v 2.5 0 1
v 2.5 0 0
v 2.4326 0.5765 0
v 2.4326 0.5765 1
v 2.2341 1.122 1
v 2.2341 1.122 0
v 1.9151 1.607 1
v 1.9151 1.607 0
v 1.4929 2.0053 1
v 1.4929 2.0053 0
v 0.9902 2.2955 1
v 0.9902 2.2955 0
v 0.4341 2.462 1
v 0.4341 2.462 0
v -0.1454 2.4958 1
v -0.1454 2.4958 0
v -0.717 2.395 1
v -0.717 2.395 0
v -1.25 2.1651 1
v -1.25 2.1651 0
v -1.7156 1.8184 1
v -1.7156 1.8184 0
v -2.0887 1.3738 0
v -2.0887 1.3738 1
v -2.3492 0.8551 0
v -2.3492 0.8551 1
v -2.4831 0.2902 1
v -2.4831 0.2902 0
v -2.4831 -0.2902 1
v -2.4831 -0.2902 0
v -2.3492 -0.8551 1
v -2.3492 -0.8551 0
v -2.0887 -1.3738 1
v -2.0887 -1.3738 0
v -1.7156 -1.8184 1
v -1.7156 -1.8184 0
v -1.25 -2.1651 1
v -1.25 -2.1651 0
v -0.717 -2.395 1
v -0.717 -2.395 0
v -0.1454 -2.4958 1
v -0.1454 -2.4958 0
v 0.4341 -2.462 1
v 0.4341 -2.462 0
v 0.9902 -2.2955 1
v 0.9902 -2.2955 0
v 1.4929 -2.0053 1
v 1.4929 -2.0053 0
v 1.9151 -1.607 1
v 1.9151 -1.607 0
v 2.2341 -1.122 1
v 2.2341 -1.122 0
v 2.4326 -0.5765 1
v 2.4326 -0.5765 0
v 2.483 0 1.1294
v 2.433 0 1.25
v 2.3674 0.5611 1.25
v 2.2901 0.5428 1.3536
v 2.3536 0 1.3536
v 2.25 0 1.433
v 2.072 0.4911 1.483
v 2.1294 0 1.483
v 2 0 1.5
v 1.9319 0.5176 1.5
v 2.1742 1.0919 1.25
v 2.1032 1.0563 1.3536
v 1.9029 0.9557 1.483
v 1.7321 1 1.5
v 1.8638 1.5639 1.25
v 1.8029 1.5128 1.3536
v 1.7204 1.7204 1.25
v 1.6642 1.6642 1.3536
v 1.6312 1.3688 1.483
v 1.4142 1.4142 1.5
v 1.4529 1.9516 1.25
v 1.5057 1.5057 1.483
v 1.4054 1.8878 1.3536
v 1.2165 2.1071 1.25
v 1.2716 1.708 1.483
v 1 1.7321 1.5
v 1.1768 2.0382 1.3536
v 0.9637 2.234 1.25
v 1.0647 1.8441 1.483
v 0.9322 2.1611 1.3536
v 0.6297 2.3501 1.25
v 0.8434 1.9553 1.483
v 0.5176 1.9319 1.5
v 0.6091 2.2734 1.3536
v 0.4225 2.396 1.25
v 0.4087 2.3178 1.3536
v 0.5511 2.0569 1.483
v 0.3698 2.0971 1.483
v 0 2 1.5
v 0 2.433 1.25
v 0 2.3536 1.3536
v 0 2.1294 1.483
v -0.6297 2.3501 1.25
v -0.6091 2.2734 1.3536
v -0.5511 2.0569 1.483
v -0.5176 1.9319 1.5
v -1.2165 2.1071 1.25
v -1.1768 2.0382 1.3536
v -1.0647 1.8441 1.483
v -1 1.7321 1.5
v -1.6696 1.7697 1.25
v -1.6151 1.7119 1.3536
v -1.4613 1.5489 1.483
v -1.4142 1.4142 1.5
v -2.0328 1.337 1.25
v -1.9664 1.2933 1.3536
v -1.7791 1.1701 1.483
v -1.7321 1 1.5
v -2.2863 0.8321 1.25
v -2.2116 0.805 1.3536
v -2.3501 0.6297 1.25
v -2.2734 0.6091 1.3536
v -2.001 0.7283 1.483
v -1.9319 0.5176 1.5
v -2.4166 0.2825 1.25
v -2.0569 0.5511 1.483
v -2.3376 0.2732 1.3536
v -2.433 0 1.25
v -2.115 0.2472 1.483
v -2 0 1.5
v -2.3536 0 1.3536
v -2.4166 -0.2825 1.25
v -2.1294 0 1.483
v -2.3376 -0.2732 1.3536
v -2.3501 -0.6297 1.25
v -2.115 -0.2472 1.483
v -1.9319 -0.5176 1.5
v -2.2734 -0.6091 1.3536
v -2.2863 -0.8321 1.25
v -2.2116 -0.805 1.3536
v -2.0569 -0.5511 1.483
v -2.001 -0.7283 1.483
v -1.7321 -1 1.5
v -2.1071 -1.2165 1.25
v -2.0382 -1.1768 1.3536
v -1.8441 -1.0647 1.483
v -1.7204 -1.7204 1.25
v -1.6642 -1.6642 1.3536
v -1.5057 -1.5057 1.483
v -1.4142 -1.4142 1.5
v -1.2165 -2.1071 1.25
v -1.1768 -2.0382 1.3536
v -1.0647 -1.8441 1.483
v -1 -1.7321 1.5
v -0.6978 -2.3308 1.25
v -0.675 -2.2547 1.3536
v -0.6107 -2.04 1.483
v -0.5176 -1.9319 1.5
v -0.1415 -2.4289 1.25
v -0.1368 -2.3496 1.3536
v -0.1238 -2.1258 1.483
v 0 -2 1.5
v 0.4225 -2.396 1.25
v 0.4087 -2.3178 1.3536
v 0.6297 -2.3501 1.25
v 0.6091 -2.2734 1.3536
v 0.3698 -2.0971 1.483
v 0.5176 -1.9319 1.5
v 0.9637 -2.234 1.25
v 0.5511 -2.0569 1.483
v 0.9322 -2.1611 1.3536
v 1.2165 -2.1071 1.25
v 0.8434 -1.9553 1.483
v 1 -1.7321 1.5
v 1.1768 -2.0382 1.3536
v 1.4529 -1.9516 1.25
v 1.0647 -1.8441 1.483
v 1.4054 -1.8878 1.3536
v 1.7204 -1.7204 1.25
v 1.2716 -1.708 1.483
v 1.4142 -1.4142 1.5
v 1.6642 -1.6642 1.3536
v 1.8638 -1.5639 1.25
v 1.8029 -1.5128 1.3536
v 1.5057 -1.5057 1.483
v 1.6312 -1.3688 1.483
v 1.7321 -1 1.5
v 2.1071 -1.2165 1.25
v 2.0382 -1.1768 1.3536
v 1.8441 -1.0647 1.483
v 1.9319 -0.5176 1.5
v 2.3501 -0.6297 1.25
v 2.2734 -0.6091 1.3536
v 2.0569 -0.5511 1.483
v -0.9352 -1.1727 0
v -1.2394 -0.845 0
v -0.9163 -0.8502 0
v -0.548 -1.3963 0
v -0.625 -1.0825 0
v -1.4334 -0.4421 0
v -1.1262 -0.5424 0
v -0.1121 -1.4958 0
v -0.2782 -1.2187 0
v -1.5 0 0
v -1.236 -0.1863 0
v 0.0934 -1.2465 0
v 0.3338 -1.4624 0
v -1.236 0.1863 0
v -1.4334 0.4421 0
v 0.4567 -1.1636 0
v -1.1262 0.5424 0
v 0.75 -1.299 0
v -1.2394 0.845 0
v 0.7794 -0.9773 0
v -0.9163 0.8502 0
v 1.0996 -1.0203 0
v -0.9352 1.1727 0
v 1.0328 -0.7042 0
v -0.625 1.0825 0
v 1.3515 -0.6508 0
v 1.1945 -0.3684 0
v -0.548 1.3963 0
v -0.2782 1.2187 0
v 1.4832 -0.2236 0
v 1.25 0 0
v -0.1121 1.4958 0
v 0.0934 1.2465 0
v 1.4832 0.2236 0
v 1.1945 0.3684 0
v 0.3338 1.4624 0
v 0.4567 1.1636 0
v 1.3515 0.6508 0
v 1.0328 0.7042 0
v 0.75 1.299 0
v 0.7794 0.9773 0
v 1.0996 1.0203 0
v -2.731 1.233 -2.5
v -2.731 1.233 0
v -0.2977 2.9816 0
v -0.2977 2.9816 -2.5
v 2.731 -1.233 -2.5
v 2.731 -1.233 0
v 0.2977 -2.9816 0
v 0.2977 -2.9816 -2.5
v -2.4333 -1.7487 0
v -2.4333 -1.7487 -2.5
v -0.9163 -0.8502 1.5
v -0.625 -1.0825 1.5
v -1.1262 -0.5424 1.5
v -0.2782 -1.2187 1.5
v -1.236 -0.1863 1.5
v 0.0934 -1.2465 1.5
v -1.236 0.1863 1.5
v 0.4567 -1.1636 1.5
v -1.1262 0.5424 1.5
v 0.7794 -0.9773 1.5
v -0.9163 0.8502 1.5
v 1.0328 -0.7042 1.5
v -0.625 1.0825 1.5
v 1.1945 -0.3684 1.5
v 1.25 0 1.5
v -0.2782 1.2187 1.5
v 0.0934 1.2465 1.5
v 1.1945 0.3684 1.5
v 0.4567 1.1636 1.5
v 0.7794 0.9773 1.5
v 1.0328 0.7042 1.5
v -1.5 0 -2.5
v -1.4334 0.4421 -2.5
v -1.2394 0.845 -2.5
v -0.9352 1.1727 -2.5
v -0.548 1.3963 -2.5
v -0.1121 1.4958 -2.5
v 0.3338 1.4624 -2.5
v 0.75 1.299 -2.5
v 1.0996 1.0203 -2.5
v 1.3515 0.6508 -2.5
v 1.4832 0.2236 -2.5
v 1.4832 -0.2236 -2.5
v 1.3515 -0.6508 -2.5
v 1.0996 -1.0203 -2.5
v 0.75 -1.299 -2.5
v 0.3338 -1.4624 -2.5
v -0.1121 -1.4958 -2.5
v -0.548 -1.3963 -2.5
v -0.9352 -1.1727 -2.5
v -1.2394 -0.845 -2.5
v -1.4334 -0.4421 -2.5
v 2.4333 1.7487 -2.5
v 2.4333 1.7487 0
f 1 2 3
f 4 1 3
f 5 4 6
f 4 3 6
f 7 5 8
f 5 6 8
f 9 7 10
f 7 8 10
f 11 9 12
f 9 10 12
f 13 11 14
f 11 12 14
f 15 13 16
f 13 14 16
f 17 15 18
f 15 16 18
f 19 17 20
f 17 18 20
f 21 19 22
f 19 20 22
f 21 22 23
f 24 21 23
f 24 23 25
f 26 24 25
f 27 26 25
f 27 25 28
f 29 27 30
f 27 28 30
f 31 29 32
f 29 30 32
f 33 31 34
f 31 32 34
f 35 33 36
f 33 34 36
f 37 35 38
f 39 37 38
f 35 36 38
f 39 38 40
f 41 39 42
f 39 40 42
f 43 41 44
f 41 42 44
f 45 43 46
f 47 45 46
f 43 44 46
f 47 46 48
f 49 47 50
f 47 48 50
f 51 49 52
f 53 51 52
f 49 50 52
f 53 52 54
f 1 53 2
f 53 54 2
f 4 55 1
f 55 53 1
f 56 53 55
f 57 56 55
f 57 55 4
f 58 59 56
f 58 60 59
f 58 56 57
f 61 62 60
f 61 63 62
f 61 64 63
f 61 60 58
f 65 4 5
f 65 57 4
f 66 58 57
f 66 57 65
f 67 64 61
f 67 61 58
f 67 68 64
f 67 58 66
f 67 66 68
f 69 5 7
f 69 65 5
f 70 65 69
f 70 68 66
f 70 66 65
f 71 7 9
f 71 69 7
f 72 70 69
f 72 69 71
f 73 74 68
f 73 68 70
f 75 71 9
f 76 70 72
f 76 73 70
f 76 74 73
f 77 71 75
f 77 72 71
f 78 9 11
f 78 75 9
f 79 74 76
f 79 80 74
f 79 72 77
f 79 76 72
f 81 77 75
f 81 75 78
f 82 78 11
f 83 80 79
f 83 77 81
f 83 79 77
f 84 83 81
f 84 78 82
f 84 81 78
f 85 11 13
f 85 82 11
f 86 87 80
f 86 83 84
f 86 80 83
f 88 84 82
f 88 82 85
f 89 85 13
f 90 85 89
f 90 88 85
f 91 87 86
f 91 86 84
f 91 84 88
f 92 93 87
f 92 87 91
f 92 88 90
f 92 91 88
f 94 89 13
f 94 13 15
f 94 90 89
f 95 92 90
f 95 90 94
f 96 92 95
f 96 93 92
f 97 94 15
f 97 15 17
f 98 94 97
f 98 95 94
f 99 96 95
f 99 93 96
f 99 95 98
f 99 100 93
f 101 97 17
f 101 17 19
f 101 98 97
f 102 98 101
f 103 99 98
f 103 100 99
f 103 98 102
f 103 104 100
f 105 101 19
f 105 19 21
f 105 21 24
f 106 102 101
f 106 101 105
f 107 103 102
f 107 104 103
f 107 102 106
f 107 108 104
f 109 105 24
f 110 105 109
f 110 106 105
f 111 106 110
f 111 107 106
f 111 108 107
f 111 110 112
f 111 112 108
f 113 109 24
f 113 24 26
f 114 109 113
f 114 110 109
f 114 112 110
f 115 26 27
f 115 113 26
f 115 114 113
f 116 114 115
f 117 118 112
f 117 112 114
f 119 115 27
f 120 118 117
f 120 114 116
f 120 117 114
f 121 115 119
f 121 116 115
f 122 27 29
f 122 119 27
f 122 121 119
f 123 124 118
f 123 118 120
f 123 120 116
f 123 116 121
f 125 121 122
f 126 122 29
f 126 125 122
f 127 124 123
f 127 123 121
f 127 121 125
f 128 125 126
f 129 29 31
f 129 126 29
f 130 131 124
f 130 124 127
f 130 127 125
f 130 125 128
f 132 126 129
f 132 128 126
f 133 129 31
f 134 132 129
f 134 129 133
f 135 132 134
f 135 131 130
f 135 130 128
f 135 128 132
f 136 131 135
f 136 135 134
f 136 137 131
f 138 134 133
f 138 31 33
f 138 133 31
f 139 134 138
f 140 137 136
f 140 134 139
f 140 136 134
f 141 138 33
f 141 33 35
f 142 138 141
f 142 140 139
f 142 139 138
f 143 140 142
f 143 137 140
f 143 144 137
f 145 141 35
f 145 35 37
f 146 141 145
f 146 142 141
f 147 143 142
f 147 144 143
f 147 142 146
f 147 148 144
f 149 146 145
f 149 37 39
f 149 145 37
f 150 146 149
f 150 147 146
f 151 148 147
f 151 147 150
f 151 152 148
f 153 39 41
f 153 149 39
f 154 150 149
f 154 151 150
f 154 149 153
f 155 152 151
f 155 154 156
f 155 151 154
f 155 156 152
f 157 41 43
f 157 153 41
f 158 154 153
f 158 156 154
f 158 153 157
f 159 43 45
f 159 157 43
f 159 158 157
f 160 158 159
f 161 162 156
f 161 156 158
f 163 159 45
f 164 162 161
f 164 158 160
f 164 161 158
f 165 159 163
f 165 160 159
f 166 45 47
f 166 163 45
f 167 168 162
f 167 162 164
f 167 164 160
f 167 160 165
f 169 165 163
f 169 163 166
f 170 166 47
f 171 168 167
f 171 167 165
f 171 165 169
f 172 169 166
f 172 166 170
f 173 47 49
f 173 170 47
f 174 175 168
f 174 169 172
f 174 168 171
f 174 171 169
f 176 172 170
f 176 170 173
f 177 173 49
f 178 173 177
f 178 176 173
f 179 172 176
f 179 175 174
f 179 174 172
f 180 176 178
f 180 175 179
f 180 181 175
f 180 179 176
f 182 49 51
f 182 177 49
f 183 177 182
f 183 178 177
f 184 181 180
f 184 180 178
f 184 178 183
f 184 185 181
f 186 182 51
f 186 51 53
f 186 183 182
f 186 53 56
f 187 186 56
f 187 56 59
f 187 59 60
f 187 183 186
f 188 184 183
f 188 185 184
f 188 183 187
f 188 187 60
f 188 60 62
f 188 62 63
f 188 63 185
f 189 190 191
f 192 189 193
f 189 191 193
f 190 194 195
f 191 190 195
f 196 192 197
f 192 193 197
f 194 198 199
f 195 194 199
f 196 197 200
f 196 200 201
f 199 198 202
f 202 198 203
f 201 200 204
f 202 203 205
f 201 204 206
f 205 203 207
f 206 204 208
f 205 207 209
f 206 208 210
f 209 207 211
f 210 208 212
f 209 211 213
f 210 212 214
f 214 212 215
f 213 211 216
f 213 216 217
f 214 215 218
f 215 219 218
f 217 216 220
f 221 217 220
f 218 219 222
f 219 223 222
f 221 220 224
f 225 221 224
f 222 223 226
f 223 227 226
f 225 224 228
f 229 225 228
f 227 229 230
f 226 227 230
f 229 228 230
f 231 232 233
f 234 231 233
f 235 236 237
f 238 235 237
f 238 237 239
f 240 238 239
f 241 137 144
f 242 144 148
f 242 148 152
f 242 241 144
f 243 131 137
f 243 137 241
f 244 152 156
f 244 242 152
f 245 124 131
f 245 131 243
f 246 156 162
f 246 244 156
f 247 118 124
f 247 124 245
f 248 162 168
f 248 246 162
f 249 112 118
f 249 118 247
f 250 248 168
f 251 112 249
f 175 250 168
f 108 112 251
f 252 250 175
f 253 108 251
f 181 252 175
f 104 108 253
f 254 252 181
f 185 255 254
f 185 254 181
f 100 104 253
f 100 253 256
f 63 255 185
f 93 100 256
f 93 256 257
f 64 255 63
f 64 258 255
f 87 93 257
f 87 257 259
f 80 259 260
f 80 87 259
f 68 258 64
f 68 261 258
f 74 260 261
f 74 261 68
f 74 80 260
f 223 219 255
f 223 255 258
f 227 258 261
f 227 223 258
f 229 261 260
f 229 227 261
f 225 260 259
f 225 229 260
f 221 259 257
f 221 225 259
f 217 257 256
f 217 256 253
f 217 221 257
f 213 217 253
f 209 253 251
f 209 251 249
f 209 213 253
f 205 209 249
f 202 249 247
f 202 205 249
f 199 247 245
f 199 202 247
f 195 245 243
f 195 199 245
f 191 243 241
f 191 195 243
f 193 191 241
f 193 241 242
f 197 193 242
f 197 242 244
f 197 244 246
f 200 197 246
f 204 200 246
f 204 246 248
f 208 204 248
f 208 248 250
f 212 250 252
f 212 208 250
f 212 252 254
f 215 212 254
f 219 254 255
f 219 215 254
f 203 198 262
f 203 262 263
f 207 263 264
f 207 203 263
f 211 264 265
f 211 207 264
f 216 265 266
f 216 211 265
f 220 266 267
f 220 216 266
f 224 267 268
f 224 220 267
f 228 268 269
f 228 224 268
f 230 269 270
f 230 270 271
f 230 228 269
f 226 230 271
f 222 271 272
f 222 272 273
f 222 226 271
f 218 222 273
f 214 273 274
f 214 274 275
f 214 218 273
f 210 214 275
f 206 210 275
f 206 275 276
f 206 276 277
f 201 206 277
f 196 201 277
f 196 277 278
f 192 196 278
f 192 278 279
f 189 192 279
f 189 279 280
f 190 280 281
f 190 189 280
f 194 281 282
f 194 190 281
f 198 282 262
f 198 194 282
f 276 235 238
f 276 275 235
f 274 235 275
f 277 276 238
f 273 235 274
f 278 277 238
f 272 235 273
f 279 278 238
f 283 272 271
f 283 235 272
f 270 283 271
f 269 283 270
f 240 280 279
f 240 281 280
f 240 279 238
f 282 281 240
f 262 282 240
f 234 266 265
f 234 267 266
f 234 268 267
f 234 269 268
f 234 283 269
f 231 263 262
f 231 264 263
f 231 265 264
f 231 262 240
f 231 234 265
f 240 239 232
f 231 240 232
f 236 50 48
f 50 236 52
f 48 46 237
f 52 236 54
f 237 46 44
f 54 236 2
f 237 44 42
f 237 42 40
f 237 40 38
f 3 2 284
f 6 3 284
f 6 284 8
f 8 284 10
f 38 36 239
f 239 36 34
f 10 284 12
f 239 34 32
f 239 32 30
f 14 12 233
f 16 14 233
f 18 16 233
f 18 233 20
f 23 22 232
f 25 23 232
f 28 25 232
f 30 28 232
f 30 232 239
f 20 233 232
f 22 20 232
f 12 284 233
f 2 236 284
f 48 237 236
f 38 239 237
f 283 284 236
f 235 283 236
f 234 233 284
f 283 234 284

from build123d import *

# Parameters (mm, degrees)
SKETCH_1_R      = 2.5
SKETCH_1_R_2    = 1.25
EXTRUDE_1_DEPTH = 1.5
FILLET_1_R      = 0.5
SKETCH_2_R      = 1.5
EXTRUDE_2_DEPTH = 2.5


with BuildPart() as part:
    # 草图1 → 凸台-拉伸1 (new body)
    with BuildSketch(Plane.XY):
        Circle(SKETCH_1_R)
        Circle(SKETCH_1_R_2, mode=Mode.SUBTRACT)
    extrude(amount=EXTRUDE_1_DEPTH)

    # 圆角1
    fillet_1_edges = [part.edges().sort_by_distance(p)[0] for p in [
        (-2.5, 0, 1.5),
    ]]
    fillet(fillet_1_edges, radius=FILLET_1_R)

    # 草图2 → 凸台-拉伸2 (add)
    with BuildSketch(Plane(origin=(0, 0, 0), x_dir=(-1, 0, 0), z_dir=(0, 0, -1))):
        Polygon((2.433288981, -1.748657981), (2.731026725, 1.232961082), (0.297737744, 2.981619063), (-2.433288981, 1.748657981), (-2.731026725, -1.232961082), (-0.297737744, -2.981619063), align=None)
        Circle(SKETCH_2_R, mode=Mode.SUBTRACT)
    extrude(amount=EXTRUDE_2_DEPTH)


solid = part.part
